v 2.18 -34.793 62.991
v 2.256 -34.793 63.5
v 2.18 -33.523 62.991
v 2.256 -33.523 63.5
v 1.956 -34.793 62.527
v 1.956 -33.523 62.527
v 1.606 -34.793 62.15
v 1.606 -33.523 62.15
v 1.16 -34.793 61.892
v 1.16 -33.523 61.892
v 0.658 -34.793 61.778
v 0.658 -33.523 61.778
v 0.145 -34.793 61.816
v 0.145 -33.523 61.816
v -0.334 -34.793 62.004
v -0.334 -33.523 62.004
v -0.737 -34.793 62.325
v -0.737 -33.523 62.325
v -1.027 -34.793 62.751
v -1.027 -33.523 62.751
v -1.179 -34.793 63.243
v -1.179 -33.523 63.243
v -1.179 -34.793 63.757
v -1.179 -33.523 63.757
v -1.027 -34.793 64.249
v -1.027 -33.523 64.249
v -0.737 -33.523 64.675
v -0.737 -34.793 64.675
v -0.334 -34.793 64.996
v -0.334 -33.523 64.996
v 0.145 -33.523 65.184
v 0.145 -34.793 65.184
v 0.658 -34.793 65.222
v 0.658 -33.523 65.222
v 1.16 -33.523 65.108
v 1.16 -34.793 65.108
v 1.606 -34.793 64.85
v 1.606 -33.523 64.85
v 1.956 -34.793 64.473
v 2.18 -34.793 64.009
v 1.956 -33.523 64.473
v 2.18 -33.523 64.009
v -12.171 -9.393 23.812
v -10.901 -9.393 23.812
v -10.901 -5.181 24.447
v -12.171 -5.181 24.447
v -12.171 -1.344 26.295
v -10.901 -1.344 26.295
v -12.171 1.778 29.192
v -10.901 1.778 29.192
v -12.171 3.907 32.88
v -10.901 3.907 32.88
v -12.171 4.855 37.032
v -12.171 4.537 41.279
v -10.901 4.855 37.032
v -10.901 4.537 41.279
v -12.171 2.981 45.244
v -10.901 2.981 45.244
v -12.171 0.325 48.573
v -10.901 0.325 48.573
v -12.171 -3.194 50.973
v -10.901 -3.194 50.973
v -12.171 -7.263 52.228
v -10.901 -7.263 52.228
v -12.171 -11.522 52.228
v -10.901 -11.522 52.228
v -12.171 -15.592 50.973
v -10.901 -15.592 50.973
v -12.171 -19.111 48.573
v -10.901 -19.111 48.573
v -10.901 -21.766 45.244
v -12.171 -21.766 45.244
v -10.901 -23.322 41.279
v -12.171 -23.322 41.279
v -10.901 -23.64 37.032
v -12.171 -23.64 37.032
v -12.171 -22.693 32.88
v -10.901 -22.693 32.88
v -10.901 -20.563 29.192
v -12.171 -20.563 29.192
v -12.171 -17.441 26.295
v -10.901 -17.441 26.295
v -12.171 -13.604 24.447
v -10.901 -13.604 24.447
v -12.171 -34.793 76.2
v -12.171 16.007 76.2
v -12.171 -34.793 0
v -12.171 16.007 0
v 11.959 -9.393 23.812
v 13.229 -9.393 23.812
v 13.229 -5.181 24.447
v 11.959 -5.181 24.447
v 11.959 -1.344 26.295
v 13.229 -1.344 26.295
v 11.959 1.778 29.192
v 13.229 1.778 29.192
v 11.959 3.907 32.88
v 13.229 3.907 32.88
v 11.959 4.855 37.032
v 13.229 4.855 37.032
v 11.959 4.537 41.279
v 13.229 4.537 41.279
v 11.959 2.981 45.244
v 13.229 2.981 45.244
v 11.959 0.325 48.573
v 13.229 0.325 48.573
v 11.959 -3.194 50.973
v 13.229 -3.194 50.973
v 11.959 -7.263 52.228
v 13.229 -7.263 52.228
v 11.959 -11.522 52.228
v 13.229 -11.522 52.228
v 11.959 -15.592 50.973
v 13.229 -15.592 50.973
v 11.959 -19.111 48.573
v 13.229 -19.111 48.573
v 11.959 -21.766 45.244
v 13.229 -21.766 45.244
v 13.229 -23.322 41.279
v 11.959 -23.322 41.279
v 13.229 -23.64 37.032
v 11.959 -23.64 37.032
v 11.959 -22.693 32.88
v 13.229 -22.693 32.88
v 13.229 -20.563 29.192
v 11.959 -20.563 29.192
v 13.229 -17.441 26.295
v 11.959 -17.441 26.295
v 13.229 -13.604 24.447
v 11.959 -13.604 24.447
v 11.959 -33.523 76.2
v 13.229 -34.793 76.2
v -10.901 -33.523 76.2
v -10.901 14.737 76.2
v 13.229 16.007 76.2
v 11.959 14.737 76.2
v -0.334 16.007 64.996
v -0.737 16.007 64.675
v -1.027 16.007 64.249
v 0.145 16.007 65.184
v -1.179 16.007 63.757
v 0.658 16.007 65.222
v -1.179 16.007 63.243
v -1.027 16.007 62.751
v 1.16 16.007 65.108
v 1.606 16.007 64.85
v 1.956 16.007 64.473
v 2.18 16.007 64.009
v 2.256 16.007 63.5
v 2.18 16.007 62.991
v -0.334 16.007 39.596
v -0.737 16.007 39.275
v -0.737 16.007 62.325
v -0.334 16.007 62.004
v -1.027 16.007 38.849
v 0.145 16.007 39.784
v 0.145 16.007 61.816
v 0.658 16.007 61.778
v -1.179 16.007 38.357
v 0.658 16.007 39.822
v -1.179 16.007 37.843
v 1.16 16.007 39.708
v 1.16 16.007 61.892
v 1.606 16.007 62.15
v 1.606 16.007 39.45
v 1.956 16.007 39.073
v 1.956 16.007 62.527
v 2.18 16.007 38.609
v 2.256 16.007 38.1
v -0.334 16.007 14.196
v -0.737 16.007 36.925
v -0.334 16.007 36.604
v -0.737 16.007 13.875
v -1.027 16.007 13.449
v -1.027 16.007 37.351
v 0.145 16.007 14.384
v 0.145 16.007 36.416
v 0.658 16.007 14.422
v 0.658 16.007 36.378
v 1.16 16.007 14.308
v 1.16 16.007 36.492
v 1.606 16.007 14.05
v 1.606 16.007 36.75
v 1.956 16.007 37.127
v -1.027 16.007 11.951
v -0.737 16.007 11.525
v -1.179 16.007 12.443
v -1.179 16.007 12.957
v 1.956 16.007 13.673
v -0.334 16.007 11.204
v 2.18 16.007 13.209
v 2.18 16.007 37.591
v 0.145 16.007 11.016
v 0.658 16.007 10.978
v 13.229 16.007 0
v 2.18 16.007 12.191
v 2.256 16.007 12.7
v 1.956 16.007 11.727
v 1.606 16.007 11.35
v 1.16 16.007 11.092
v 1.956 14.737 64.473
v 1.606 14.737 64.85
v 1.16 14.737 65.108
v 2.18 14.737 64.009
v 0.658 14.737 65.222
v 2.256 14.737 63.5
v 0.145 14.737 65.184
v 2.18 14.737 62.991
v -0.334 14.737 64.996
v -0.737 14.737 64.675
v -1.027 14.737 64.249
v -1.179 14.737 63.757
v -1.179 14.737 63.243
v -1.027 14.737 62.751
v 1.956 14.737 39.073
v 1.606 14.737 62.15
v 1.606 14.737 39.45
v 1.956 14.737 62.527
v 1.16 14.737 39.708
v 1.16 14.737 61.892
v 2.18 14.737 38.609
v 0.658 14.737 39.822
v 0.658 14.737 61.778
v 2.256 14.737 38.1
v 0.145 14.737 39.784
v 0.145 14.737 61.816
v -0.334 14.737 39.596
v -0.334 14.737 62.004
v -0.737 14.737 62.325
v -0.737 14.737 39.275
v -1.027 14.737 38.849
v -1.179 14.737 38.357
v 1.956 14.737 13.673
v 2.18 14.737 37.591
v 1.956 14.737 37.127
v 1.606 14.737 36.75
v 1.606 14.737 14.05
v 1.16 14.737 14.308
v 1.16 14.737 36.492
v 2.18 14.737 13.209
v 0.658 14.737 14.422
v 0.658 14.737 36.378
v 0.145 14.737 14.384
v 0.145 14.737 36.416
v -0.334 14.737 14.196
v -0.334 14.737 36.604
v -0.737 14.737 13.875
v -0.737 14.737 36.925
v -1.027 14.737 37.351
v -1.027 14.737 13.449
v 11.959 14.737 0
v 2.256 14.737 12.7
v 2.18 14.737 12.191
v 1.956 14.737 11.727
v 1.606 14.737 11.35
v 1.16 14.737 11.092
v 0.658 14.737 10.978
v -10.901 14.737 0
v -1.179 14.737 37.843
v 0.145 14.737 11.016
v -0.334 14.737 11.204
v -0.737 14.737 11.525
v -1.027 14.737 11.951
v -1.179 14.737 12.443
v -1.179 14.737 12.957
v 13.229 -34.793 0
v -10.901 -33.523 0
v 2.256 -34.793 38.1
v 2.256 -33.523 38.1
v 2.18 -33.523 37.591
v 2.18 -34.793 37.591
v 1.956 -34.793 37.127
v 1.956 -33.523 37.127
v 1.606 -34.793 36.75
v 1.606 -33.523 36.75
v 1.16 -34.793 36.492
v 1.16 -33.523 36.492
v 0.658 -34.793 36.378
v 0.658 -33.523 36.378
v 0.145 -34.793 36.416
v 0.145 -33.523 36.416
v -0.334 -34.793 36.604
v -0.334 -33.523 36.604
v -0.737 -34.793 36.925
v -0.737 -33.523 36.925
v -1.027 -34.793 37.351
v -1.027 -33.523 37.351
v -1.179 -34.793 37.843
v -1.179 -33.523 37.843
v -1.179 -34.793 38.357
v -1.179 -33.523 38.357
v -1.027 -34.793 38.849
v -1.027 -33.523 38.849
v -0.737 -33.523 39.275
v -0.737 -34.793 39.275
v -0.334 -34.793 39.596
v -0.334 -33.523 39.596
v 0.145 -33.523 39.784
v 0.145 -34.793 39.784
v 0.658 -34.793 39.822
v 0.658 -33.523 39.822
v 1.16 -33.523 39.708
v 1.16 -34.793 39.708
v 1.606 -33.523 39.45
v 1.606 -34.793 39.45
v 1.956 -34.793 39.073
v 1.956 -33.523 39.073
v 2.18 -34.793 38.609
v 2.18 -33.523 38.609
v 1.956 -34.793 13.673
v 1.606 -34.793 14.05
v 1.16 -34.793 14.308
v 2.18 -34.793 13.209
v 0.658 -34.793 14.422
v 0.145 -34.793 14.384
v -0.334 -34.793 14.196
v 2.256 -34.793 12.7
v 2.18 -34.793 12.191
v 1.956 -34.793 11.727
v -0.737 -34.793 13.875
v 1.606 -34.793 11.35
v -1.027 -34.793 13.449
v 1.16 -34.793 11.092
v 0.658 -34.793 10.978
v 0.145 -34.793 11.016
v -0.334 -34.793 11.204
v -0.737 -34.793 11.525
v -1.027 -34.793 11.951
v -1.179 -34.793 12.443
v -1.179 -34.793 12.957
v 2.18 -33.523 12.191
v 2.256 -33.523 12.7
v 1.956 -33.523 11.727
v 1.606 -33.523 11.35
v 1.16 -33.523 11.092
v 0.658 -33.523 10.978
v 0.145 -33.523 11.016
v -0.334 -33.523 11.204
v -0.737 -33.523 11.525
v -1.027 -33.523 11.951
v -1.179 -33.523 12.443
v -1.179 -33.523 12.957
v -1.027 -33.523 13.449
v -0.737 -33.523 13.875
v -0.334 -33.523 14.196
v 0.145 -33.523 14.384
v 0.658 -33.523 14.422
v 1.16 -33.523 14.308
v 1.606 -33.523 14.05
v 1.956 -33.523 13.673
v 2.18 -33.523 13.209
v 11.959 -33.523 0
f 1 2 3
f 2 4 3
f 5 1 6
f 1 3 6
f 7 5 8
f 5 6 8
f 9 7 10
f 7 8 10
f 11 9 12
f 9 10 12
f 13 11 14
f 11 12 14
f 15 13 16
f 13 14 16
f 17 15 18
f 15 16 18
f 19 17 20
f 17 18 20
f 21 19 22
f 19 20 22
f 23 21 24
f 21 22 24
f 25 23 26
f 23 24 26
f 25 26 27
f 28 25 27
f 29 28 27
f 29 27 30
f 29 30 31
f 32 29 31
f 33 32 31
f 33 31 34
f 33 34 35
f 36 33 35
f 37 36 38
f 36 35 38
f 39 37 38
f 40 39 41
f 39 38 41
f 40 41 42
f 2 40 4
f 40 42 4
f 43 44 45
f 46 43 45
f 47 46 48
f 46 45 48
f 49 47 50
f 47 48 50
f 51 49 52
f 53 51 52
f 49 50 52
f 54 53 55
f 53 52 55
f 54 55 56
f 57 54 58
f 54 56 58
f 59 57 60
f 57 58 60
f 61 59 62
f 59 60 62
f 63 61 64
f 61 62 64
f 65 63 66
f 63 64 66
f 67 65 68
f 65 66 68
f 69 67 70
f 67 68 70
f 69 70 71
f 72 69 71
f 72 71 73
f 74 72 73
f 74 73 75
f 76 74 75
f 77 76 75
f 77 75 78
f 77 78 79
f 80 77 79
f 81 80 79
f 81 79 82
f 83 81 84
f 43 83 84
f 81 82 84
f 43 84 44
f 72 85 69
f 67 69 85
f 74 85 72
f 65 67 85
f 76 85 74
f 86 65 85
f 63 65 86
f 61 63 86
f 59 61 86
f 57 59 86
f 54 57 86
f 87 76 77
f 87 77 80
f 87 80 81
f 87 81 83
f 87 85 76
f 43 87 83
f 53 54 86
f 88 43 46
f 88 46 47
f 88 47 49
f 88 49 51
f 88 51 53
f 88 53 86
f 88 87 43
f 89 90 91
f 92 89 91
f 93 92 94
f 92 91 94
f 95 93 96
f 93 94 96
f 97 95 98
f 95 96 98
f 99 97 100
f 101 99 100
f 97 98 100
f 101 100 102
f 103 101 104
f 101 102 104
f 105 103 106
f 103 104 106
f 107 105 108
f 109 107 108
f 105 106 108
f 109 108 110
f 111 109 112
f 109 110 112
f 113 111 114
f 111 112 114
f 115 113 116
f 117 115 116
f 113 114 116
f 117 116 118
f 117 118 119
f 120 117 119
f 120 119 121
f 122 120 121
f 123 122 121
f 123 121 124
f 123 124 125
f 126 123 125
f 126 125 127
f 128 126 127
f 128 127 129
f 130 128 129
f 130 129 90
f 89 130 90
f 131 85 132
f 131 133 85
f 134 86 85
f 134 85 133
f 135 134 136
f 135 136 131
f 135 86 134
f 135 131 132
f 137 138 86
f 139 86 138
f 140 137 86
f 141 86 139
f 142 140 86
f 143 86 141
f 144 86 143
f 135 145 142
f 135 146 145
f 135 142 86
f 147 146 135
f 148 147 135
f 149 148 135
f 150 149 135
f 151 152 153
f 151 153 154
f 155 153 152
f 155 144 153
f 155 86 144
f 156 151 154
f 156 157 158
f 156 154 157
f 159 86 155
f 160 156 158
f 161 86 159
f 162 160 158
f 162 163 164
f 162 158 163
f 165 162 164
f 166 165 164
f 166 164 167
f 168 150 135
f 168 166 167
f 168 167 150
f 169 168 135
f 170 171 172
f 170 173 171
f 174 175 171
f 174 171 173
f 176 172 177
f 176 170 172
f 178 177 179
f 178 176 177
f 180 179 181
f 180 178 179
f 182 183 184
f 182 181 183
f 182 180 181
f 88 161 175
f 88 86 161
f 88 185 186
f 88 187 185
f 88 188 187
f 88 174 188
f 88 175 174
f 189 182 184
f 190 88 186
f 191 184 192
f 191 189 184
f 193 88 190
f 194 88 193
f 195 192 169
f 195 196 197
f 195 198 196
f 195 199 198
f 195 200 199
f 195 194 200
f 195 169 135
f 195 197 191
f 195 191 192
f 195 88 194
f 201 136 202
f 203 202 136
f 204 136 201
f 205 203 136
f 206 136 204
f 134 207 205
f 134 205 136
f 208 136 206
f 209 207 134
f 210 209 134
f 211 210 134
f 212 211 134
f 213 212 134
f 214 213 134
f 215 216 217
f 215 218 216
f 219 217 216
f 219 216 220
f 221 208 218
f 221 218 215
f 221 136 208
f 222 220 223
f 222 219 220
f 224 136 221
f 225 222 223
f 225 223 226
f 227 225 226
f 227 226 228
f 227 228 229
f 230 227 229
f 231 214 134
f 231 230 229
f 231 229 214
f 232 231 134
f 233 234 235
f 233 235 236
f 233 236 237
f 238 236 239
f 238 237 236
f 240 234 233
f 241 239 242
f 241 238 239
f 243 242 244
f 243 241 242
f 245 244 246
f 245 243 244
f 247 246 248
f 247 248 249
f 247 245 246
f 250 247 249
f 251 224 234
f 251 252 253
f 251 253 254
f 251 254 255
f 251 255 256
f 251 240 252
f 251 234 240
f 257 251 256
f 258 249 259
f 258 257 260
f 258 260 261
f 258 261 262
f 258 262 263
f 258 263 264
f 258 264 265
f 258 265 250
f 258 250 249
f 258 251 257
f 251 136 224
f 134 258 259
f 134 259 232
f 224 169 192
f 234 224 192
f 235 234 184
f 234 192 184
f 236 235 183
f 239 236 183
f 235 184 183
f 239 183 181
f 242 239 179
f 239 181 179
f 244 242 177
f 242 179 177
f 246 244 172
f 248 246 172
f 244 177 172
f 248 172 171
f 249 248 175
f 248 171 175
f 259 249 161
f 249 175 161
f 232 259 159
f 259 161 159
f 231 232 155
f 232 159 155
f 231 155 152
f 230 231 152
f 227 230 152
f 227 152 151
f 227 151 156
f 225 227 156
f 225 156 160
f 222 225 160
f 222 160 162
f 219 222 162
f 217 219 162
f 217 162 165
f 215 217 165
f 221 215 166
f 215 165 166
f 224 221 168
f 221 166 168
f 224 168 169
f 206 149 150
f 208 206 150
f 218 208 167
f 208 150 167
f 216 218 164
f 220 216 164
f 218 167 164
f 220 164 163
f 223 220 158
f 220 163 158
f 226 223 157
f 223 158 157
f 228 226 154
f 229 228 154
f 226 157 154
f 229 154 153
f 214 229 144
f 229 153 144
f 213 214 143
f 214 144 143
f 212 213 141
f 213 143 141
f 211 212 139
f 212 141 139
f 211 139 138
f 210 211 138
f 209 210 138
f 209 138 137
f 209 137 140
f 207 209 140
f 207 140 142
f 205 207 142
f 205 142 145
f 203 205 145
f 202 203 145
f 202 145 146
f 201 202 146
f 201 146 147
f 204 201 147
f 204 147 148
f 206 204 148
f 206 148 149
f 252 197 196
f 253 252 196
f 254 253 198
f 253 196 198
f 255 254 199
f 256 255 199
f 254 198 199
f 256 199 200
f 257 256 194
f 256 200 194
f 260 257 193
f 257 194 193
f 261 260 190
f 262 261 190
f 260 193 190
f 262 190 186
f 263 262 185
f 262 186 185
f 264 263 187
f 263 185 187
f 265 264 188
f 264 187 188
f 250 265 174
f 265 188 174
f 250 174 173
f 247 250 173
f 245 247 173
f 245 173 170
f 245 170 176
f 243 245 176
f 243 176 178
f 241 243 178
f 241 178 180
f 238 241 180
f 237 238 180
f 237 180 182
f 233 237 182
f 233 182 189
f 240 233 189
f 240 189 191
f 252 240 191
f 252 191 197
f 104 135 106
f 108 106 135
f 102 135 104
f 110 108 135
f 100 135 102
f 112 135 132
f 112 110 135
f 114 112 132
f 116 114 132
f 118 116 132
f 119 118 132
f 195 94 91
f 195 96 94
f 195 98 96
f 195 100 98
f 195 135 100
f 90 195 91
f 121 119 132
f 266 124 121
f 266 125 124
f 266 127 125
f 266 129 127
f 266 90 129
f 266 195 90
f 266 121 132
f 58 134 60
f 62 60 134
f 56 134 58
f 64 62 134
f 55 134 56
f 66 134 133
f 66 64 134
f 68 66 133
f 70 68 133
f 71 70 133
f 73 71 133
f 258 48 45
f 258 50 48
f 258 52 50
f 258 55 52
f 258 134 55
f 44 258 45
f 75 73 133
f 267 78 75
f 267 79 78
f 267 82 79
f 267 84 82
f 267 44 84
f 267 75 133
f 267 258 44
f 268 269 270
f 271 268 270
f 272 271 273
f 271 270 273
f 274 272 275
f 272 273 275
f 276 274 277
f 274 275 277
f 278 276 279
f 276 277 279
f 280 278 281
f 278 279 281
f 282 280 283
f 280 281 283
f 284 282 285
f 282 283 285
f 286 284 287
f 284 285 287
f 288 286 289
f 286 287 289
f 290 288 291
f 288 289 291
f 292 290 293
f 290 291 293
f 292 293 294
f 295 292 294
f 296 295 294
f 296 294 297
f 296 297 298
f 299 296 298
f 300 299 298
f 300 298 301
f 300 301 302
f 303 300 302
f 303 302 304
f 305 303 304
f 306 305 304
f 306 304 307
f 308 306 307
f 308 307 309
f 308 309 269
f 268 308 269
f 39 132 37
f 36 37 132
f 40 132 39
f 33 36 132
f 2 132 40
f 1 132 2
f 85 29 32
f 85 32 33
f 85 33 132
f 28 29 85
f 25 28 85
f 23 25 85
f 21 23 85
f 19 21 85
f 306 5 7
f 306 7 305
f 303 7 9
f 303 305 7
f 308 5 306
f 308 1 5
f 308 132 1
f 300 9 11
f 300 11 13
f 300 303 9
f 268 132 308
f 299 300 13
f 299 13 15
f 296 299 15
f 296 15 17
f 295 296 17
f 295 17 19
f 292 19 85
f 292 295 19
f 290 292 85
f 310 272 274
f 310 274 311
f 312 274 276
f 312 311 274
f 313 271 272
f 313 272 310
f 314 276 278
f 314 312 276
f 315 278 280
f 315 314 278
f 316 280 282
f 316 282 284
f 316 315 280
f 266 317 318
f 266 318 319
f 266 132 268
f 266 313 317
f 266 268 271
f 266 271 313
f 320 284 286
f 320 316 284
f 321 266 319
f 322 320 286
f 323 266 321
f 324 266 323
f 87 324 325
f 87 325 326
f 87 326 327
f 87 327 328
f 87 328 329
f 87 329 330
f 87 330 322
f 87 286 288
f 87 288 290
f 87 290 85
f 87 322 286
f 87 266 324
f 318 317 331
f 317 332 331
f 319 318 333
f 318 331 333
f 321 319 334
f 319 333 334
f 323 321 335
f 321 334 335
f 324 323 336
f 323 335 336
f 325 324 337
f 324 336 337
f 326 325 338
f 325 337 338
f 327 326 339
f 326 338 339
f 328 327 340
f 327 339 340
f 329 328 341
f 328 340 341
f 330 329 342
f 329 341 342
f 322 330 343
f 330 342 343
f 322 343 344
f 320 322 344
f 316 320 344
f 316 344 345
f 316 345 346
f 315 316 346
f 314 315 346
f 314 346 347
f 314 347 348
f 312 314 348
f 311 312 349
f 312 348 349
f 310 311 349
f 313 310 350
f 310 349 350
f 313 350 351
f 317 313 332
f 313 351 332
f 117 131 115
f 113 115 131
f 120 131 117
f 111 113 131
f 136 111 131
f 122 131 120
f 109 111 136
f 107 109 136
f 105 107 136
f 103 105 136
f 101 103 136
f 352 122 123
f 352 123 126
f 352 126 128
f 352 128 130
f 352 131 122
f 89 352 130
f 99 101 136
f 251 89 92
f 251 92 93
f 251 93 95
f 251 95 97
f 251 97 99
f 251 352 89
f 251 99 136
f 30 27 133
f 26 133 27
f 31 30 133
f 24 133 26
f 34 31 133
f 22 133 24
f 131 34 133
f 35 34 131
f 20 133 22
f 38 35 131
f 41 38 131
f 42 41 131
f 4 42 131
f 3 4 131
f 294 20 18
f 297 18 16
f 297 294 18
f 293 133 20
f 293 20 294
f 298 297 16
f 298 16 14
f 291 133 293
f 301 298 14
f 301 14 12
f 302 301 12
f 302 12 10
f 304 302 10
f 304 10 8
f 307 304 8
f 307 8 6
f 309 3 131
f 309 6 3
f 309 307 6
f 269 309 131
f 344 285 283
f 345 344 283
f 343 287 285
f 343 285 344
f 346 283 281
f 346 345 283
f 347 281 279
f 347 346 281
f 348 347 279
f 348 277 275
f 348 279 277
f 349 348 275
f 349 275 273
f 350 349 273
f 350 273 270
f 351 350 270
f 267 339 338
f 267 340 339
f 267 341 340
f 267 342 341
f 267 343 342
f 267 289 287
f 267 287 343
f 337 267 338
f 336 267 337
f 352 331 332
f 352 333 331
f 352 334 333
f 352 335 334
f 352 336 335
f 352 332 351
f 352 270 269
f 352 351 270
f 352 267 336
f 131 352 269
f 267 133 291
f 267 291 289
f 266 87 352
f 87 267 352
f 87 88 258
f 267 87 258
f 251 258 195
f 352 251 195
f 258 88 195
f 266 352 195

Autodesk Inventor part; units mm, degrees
ref_plane "YZ Plane" through (0, 0, 0) normal (1, 0, 0) x (0, 1, 0)
ref_plane "XZ Plane" through (0, 0, 0) normal (0, 1, 0) x (-1, 0, 0)
ref_plane "XY Plane" through (0, 0, 0) normal (0, 0, 1) x (1, 0, 0)
sketch "Sketch1" plane through (0, 0, 0) normal (0, 0, 1) x (1, 0, 0)
  line L0 (-12.1708, 16.0073) -> (13.2292, 16.0073)
  line L1 (13.2292, 16.0073) -> (13.2292, -34.7927)
  line L2 (13.2292, -34.7927) -> (-12.1708, -34.7927)
  line L3 (-12.1708, -34.7927) -> (-12.1708, 16.0073)
  line L4 (11.9592, 14.7373) -> (-10.9008, 14.7373)
  line L5 (-10.9008, 14.7373) -> (-10.9008, -33.5227)
  line L6 (-10.9008, -33.5227) -> (11.9592, -33.5227)
  line L7 (11.9592, -33.5227) -> (11.9592, 14.7373)
  point P0 (0, 0)
  dimension "d0" = 25.4
  dimension "d1" = 50.8
  dimension "d2" = 1.27
extrude "Extrusion1" add sketch "Sketch1" along normal blind 76.2
sketch "Sketch2" plane through (-12.1708, 16.0073, 0) normal (0, 1, 0) x (1, 0, 0)
  circle A0 centre (12.7, -12.7) radius 1.7272
  line L0 (25.4, 0) -> (0, 0) projected
  line L1 (0, 0) -> (0, -76.2) projected
  point P0 (12.1708, 0)
  dimension "d5" = 3.4544
  dimension "d6" = 12.7
  dimension "d7" = 12.7
extrude "Extrusion2" cut sketch "Sketch2" against normal through all
pattern_linear "Rectangular Pattern1" count 8 spacing 25.4 along (0, 0, 1) of "Extrusion2"
sketch "Sketch3" plane through (13.2292, -34.7927, 0) normal (1, 0, 0) x (0, 0, -1)
  circle A0 centre (-38.1, 25.4) radius 14.2875
  line L0 (0, 0) -> (-76.2, 0) projected
  line L1 (-76.2, 0) -> (-76.2, 50.8) projected
  point P0 (0, 34.7927)
  dimension "d15" = 25.4
  dimension "d16" = 38.1
  dimension "d17" = 28.575
extrude "Extrusion3" cut sketch "Sketch3" against normal through all
equation "\"d3\" = d13"
equation "\"d10\" = d14"
equation "\"d13\" = 76.2"
equation "\"d14\" = d13"
properties part number "Test  Stock Rotation extender"
